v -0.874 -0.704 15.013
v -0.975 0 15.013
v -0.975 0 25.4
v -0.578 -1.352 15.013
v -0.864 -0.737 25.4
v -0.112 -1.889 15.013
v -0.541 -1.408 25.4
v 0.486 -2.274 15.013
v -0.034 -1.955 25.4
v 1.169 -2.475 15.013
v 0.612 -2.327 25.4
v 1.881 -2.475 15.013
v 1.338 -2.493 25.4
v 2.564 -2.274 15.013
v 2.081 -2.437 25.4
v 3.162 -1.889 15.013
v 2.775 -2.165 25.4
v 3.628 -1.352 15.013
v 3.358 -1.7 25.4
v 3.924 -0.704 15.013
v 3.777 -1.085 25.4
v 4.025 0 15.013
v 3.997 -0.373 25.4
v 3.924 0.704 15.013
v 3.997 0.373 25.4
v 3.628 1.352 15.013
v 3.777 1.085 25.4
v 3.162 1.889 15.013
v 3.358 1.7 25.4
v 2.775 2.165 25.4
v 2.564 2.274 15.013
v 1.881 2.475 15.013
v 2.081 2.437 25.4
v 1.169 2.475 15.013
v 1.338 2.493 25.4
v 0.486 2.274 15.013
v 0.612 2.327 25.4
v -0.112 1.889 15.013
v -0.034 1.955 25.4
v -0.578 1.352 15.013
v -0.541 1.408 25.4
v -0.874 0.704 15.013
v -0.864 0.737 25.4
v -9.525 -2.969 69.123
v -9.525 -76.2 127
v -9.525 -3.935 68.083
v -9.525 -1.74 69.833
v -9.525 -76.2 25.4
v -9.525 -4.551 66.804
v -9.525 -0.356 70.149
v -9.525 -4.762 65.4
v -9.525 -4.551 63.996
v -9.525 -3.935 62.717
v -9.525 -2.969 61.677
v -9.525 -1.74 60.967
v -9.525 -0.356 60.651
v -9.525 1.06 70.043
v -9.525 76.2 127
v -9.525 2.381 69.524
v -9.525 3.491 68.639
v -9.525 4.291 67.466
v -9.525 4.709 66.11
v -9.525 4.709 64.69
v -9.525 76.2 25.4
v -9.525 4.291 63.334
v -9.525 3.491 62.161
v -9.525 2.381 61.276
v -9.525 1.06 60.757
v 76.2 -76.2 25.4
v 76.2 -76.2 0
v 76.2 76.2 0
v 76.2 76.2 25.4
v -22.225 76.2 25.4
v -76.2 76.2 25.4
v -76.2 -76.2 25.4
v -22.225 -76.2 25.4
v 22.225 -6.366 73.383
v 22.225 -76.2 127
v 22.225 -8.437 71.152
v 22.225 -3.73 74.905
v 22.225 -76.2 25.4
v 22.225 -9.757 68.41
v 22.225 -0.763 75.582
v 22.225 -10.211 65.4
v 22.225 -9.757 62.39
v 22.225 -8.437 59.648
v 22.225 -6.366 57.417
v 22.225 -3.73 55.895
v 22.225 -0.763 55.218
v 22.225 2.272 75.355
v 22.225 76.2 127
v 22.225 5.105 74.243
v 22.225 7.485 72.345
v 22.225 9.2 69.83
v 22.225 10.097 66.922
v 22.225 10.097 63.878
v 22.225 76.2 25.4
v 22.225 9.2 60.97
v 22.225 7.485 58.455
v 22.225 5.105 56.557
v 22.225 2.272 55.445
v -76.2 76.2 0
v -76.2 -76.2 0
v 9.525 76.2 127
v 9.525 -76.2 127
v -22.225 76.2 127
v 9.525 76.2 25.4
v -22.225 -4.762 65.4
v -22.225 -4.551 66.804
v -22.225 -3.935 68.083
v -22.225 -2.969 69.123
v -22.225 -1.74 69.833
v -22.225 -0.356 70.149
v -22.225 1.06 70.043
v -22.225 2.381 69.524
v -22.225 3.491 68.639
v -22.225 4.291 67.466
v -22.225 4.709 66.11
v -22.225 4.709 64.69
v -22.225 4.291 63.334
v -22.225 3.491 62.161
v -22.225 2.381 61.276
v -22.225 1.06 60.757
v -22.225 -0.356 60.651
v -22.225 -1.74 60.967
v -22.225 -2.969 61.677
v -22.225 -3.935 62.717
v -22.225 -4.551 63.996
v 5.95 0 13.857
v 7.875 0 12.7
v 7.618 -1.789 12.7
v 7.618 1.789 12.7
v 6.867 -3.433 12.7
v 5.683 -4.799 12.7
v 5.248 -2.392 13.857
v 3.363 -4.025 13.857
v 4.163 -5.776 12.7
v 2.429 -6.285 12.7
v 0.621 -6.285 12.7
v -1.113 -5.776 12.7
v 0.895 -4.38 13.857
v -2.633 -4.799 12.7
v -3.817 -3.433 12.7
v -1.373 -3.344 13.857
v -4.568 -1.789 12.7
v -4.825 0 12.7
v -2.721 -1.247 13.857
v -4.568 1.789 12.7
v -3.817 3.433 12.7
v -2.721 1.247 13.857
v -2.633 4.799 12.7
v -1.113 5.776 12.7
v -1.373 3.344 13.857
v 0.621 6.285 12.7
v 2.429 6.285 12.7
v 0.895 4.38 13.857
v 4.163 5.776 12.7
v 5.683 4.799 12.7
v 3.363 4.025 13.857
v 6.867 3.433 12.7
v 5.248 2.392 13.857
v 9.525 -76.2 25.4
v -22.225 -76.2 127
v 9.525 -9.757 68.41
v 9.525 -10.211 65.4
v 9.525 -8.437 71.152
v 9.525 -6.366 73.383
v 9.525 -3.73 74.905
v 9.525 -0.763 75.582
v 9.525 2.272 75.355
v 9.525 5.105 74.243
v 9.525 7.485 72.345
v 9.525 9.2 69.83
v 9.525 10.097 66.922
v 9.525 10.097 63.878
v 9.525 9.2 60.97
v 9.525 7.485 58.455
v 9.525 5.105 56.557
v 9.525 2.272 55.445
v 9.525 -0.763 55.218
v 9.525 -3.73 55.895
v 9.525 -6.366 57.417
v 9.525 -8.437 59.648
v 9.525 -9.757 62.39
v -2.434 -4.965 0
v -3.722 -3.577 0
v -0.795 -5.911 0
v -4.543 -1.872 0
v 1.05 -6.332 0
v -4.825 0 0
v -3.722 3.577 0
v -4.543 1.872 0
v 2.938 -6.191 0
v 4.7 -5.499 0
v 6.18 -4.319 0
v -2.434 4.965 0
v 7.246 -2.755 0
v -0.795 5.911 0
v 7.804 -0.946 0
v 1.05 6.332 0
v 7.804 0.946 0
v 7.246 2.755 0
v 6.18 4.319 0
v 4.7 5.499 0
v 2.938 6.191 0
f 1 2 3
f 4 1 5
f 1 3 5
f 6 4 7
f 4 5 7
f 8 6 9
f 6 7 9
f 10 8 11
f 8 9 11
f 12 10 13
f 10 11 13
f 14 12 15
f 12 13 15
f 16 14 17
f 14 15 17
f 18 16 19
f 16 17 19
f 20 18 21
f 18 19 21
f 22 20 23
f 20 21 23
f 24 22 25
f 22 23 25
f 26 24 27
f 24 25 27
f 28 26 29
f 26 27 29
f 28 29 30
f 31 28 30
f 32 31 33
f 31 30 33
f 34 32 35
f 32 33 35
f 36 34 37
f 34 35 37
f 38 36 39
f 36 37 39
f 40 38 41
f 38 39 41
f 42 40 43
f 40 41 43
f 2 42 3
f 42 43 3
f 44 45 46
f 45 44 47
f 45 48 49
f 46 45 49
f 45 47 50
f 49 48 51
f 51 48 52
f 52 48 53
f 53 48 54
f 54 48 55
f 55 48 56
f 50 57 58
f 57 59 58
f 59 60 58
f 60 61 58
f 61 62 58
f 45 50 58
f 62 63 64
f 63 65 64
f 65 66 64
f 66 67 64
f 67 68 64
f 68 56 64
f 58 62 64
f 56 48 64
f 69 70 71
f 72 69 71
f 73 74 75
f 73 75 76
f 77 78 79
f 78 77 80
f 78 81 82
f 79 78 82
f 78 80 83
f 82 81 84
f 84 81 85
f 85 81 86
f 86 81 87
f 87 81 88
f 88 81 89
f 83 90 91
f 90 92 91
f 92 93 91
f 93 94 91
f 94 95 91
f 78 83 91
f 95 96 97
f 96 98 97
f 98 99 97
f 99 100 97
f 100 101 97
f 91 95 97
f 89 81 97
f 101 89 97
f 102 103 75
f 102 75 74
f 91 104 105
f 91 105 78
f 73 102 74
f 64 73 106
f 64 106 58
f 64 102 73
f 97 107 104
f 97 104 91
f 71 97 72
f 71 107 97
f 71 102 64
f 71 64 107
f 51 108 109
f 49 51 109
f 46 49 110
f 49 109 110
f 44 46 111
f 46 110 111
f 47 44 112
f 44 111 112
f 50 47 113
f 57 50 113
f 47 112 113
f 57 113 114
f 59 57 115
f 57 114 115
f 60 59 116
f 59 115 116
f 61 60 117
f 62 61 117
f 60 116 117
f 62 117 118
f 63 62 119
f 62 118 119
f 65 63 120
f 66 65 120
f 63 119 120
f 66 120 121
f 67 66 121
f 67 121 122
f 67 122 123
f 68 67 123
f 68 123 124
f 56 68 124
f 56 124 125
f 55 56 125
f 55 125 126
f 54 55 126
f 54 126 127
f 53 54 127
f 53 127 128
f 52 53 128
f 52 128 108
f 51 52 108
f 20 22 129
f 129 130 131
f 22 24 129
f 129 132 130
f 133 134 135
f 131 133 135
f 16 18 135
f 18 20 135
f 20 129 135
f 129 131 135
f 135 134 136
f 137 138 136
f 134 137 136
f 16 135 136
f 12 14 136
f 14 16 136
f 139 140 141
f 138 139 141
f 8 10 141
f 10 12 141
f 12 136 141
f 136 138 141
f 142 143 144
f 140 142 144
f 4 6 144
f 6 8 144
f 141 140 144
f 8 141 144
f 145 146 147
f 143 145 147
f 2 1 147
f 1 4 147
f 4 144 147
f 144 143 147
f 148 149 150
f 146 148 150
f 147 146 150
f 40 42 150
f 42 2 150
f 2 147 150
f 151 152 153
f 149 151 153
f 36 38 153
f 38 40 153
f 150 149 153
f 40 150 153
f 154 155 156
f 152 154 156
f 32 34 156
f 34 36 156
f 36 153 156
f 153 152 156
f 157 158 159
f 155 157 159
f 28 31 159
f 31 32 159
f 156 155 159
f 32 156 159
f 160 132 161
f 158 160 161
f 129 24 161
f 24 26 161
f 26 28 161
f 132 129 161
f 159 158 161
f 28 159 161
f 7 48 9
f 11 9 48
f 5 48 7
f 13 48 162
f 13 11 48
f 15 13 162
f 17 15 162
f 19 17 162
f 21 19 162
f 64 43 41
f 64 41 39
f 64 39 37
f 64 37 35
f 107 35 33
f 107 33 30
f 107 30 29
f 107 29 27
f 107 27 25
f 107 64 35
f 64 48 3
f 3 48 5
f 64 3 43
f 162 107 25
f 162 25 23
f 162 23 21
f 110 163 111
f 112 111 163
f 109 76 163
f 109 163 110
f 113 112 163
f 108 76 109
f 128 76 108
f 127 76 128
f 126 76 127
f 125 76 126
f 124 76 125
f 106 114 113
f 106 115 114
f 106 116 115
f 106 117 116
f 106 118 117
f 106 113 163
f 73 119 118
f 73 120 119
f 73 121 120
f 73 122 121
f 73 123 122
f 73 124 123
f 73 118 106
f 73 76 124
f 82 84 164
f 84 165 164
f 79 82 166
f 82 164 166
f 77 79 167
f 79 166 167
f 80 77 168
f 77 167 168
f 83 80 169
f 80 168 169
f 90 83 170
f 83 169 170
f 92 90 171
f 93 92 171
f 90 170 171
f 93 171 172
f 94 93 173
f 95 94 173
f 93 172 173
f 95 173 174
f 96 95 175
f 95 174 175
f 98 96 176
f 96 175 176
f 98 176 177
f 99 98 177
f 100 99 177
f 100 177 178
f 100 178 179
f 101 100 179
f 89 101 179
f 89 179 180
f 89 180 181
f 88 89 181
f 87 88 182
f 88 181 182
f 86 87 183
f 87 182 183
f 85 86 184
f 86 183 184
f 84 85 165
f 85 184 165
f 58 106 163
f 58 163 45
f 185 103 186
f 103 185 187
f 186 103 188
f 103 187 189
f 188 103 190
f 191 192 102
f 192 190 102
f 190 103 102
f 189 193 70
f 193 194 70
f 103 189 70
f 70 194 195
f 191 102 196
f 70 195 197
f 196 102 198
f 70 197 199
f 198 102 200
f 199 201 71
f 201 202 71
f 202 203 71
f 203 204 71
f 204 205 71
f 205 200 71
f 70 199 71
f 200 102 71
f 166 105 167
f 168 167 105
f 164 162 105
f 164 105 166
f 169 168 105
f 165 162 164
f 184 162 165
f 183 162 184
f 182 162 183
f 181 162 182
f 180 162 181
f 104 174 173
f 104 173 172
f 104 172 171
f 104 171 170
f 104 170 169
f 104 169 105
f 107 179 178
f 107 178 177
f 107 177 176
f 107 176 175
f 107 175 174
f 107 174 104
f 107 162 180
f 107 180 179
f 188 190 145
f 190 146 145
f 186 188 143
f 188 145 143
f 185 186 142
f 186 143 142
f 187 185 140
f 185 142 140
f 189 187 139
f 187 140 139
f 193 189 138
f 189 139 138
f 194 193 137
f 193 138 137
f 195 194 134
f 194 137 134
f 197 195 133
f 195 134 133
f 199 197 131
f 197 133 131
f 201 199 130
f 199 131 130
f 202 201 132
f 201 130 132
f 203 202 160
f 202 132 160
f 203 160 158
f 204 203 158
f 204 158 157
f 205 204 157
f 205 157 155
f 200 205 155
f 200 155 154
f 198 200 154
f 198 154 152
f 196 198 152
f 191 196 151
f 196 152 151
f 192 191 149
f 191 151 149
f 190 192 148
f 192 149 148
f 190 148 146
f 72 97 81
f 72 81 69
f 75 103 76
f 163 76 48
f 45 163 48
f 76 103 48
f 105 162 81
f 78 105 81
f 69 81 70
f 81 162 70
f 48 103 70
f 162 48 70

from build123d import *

# Parameters (mm, degrees)
F0_W     = 152.4
F0_H     = 152.4
F1_DEPTH = 25.4
F2_W     = 12.7
F2_H     = 152.4
F3_DEPTH = 101.6
F5_D     = 20.4216
F5_DEPTH = 12.7
F5_TIP   = 6.1352676088
F7_D     = 5
F7_DEPTH = 25.4
F7_TIP   = 1.5021515476
F8_D     = 12.7
F8_DEPTH = 12.7
F8_TIP   = 3.8154649308
F9_D     = 9.525
F9_DEPTH = 44.45
F9_START = 31.75
F9_TIP   = 2.8615986981


with BuildPart() as f1:
    # F0 (on Top) → F1 (new body)
    with BuildSketch(Plane.XY):
        Rectangle(F0_W, F0_H)
    extrude(amount=F1_DEPTH)

    # F2 (on face) → F3 (join)
    with BuildSketch(Plane.XY.offset(25.4)):
        with Locations((-15.875, 0)):
            Rectangle(F2_W, F2_H)
        with Locations((15.875, 0)):
            Rectangle(F2_W, F2_H)
    extrude(amount=F3_DEPTH)

    # F5
    with Locations(Plane.YZ.offset(22.225)):
        with Locations((0, 65.4)):
            Hole(F5_D / 2, depth=F5_DEPTH)
            with Locations((0, 0, -(F5_DEPTH + F5_TIP / 2))):  # 118° drill point
                Cone(0, F5_D / 2, F5_TIP, mode=Mode.SUBTRACT)

    # F7
    with Locations(Plane(origin=(0, 0, 0), x_dir=(1, 0, 0), z_dir=(0, 0, -1))):
        with Locations((1.525, 0)):
            Hole(F7_D / 2, depth=F7_DEPTH)
            with Locations((0, 0, -(F7_DEPTH + F7_TIP / 2))):  # 118° drill point
                Cone(0, F7_D / 2, F7_TIP, mode=Mode.SUBTRACT)

    # F8
    with Locations(Plane(origin=(0, 0, 0), x_dir=(1, 0, 0), z_dir=(0, 0, -1))):
        with Locations((1.525, 0)):
            Hole(F8_D / 2, depth=F8_DEPTH)
            with Locations((0, 0, -(F8_DEPTH + F8_TIP / 2))):  # 118° drill point
                Cone(0, F8_D / 2, F8_TIP, mode=Mode.SUBTRACT)

    # F9
    # its depths count from where the whole tool has entered the part; down to there all is cleared
    with Locations(Plane.YZ.offset(22.225).offset(-F9_START)):
        with Locations((0, 65.4)):
            Hole(F9_D / 2, depth=F9_DEPTH)
            with Locations((0, 0, -(F9_DEPTH + F9_TIP / 2))):  # 118° drill point
                Cone(0, F9_D / 2, F9_TIP, mode=Mode.SUBTRACT)


solid = f1.part
